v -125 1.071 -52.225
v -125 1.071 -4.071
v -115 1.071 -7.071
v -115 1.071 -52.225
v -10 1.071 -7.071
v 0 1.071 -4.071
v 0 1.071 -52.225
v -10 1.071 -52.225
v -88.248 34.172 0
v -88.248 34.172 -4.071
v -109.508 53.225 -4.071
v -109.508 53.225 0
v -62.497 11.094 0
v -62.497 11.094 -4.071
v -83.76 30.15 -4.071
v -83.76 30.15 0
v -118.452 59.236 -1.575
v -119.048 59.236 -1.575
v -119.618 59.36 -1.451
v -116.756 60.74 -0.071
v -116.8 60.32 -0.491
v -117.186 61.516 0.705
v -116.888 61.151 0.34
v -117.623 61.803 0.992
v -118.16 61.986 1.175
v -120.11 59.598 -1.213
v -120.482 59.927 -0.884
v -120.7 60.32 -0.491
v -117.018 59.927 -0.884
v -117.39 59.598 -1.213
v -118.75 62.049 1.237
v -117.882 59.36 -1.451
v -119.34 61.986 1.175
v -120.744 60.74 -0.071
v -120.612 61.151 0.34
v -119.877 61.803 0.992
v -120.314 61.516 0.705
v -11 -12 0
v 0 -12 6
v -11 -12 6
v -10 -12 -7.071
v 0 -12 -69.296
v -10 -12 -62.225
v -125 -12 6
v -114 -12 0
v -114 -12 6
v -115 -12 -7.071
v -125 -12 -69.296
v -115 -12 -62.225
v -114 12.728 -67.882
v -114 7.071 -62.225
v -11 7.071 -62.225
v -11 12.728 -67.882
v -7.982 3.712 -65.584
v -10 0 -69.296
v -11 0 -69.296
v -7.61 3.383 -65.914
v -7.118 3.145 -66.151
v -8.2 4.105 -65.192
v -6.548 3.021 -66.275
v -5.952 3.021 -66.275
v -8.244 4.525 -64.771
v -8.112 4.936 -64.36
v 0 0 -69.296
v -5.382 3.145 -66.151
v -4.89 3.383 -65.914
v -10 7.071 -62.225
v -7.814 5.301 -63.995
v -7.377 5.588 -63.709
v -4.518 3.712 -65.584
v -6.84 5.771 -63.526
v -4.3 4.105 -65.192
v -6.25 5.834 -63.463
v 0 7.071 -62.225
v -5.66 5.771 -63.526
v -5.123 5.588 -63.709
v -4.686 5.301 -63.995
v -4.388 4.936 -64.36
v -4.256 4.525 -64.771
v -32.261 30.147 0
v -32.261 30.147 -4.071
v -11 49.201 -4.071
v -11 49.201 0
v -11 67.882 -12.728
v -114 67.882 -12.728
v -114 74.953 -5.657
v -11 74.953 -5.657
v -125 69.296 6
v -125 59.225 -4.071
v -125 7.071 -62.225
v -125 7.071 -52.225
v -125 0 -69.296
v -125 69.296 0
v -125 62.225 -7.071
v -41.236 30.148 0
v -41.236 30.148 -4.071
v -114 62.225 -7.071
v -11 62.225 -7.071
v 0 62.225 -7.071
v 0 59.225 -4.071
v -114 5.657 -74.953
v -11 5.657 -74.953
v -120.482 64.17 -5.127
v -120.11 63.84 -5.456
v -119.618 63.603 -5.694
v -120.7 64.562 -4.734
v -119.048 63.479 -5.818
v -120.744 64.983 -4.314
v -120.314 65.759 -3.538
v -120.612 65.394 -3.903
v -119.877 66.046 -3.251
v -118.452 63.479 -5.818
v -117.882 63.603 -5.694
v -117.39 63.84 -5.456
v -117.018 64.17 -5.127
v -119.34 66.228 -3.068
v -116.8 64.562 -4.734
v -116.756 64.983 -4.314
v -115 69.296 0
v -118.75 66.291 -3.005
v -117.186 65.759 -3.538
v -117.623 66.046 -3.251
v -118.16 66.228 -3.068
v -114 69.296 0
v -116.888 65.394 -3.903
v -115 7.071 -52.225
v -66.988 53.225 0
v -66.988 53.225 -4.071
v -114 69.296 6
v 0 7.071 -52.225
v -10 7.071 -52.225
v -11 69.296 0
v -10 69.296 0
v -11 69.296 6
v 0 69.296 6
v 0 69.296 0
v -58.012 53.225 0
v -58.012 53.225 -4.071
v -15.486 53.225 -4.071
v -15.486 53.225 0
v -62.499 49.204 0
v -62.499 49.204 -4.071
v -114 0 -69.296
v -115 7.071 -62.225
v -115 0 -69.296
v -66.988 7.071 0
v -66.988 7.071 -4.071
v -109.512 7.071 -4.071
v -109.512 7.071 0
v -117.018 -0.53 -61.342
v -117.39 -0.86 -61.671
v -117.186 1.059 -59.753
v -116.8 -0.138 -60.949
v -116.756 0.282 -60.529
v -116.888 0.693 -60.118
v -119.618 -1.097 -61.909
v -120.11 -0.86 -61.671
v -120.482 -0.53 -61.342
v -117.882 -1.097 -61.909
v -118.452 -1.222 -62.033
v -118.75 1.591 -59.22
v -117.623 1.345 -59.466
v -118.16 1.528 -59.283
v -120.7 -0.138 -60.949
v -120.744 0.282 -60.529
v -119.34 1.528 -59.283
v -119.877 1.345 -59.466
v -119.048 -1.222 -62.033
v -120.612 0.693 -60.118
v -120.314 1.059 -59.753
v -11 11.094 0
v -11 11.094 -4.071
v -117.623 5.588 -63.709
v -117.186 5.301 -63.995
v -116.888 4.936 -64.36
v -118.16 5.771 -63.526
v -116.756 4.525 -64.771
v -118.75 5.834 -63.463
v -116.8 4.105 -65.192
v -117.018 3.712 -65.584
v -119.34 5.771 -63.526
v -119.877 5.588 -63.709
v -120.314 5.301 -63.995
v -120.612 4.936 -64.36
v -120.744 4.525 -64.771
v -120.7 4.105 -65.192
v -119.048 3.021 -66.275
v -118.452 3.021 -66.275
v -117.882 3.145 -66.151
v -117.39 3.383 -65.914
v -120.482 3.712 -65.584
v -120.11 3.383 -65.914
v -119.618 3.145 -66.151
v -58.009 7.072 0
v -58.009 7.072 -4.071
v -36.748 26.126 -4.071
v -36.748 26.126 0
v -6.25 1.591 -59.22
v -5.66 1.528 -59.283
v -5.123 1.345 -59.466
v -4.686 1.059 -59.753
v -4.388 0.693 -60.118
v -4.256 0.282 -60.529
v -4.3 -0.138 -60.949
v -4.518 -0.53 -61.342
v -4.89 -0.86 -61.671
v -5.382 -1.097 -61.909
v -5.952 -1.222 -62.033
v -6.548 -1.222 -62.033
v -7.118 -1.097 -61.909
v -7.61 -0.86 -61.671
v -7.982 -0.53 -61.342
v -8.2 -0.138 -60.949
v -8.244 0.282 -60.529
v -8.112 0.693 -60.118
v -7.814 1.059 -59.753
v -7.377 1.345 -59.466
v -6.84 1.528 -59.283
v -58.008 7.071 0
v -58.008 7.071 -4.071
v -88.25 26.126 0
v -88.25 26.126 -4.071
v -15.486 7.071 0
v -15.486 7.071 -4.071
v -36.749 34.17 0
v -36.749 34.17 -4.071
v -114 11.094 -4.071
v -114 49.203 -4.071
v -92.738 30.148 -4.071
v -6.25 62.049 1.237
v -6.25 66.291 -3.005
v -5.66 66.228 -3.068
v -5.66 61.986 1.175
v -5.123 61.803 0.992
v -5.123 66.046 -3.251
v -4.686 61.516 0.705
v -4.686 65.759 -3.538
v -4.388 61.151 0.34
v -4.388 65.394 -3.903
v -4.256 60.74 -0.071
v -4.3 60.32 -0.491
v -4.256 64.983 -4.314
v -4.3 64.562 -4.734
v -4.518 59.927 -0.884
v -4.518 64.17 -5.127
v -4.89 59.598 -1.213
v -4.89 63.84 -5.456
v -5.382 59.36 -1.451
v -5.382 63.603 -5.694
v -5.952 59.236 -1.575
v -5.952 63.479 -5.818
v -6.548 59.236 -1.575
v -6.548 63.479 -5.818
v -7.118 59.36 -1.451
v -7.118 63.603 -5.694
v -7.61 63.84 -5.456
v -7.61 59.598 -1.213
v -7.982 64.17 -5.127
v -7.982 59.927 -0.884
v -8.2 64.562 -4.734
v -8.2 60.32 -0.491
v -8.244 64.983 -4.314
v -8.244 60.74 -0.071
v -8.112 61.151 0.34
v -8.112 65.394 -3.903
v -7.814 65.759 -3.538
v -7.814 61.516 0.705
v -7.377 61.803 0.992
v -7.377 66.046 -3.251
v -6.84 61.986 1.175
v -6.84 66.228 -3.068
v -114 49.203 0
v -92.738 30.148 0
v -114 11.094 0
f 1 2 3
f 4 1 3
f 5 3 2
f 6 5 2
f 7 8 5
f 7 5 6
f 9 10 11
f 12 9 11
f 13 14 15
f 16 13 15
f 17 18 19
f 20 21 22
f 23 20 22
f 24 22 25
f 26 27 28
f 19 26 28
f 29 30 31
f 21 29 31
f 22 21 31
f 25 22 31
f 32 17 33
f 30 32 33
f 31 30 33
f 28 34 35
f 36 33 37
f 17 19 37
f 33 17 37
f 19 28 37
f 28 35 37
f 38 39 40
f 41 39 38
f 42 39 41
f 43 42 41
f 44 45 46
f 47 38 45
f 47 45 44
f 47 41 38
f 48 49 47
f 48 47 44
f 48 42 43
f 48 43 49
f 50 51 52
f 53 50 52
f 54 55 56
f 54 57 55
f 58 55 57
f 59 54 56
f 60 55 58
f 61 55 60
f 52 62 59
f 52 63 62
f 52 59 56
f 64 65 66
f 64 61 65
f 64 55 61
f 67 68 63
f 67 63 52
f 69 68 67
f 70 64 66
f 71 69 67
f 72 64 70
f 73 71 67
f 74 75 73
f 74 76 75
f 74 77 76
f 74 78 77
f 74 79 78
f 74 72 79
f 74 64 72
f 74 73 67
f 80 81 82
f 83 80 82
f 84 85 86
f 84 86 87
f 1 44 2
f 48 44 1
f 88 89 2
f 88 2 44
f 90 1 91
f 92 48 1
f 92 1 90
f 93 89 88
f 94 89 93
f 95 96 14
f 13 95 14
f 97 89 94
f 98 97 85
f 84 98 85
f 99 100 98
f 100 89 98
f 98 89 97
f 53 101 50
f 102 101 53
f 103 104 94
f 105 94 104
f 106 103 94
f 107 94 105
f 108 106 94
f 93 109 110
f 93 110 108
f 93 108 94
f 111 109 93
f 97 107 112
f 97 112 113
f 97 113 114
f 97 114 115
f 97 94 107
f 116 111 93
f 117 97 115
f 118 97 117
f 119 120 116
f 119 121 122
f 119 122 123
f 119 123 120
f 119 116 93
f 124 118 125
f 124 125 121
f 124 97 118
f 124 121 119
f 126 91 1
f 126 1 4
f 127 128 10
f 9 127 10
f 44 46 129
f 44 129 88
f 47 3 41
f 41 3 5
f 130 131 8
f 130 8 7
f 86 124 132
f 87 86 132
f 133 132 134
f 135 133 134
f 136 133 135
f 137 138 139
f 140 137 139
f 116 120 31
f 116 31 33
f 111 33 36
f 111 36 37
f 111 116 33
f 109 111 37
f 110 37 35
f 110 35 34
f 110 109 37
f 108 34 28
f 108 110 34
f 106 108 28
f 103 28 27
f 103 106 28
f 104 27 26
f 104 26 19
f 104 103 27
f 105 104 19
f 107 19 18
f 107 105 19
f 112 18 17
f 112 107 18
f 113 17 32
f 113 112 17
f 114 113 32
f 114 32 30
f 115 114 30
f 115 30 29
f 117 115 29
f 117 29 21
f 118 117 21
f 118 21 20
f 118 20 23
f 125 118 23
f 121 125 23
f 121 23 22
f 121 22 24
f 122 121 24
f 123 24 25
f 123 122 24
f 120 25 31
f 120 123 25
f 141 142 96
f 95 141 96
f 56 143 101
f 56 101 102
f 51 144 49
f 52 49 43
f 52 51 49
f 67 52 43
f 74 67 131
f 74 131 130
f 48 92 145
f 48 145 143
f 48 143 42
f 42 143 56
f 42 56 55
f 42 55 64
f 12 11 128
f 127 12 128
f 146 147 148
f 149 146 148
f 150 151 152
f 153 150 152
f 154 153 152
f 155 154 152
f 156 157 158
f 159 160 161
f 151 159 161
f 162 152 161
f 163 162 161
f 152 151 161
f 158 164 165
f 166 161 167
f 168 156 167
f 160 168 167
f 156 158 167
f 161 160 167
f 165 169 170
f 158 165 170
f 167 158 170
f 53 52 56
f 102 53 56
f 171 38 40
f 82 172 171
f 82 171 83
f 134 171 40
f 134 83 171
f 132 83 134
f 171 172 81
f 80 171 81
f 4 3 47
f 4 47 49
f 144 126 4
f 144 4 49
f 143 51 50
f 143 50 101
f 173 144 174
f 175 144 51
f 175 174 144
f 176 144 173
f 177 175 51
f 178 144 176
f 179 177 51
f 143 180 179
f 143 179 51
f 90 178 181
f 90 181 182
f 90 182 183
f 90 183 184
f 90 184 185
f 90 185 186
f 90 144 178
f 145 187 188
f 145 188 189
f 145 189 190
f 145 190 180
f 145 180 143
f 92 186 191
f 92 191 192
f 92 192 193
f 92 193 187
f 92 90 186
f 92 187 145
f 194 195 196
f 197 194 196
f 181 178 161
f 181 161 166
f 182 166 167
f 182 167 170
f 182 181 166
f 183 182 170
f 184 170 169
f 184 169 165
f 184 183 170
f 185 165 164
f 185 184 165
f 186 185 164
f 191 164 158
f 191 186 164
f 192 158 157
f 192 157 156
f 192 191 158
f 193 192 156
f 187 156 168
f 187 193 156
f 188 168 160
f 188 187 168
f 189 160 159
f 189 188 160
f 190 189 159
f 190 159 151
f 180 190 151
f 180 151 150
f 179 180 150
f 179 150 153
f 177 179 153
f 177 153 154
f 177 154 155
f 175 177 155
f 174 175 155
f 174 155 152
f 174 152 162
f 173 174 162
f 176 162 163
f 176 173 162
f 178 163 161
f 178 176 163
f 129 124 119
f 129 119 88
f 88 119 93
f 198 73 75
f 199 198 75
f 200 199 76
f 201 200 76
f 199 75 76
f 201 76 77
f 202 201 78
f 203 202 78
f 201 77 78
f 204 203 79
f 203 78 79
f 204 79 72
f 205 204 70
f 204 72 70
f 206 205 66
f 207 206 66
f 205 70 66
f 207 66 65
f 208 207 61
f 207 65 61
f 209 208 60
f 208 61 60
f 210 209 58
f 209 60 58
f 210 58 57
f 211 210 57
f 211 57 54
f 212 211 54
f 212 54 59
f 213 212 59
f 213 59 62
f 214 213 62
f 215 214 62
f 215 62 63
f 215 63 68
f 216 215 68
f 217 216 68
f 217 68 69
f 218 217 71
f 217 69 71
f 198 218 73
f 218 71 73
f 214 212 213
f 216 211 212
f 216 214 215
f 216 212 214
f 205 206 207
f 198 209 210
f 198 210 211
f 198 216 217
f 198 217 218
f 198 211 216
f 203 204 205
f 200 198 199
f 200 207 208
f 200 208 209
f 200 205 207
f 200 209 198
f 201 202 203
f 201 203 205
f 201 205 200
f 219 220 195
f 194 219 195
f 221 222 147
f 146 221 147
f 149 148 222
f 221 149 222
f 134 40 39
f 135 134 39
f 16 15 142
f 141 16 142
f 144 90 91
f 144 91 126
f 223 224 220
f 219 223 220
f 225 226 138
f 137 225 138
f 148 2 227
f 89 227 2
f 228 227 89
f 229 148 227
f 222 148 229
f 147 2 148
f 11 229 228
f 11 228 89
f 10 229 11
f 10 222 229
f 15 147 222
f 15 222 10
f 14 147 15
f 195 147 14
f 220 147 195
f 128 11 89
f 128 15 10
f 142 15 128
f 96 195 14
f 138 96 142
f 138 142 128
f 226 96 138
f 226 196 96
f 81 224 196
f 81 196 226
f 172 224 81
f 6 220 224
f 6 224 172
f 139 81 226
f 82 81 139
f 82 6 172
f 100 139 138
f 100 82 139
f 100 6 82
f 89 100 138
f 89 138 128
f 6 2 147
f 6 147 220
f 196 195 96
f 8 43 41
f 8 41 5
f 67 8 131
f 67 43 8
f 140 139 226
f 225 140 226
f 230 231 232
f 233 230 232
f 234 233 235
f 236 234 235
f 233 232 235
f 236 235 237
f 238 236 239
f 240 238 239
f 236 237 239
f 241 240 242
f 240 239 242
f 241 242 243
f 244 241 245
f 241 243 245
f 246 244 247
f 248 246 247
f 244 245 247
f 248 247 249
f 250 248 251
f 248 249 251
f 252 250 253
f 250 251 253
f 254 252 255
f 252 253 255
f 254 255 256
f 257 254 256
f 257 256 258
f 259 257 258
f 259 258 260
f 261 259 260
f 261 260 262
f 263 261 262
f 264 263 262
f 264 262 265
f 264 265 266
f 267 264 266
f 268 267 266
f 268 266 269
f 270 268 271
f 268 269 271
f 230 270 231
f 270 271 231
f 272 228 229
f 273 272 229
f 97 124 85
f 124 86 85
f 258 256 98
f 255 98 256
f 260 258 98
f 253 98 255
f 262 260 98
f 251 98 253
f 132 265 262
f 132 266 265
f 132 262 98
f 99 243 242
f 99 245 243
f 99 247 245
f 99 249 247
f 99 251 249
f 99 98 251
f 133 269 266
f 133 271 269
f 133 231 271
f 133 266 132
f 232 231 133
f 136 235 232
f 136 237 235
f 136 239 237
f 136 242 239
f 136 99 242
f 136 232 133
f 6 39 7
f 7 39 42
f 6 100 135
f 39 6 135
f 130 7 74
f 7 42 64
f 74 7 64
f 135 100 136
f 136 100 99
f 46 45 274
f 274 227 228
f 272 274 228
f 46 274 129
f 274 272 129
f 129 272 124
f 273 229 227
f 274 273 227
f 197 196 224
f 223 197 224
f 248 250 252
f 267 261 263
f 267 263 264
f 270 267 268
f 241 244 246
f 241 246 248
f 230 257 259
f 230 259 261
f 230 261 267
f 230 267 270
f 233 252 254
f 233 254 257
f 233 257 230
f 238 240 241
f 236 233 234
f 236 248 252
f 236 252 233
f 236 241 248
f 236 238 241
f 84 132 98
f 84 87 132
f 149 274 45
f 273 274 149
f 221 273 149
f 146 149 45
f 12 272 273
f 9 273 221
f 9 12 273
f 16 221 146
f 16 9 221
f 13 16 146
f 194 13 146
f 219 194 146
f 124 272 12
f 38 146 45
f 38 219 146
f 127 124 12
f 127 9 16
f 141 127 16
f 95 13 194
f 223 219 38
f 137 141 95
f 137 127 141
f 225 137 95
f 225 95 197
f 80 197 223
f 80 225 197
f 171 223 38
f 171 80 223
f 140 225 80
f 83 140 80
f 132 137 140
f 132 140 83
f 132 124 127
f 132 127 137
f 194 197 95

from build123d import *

# Parameters (mm, degrees)
BOSS_EXTRUDE3_DEPTH  = 125
SKETCH3_W            = 125
SKETCH3_H            = 69.296464556
BOSS_EXTRUDE5_DEPTH  = 12
CUT_EXTRUDE1_DEPTH   = 159.836393815
SKETCH7_W            = 105
SKETCH7_H            = 10
BOSS_EXTRUDE6_DEPTH  = 8
SKETCH8_W            = 105
SKETCH8_H            = 10
BOSS_EXTRUDE7_DEPTH  = 8
SKETCH9_W            = 105
SKETCH9_H            = 55.154328932
CUT_EXTRUDE2_DEPTH   = 161.78246173
SKETCH11_W           = 10
SKETCH11_H           = 55.154328932
CUT_EXTRUDE3_DEPTH   = 6
SKETCH12_W           = 10
SKETCH12_H           = 55.154328932
CUT_EXTRUDE4_DEPTH   = 6
SKETCH13_W           = 105
SKETCH13_H           = 61.154328932
CUT_EXTRUDE6_DEPTH   = 3
SKETCH14_R           = 1.9
CUT_EXTRUDE8_DEPTH   = 6
SKETCH15_R           = 1.9
CUT_EXTRUDE9_DEPTH   = 6
BOSS_EXTRUDE9_REACH  = 158.4
SKETCH25_W           = 10
SKETCH25_H           = 6
BOSS_EXTRUDE13_DEPTH = 10
CUT_EXTRUDE10_DEPTH  = 1
CUT_EXTRUDE11_DEPTH  = 1
SKETCH29_W           = 11
SKETCH29_H           = 81.296464556
BOSS_EXTRUDE15_DEPTH = 6
SKETCH31_R           = 2
CUT_EXTRUDE16_DEPTH  = 6
SKETCH32_R           = 2
CUT_EXTRUDE17_DEPTH  = 6
CUT_EXTRUDE22_DEPTH  = 157.400127877
CUT_EXTRUDE23_DEPTH  = 157.400127877
CUT_EXTRUDE26_REACH  = 164.072


with BuildPart() as part:
    # Sketch1 → Boss-Extrude3 (new body)
    with BuildSketch(Plane(origin=(0, 0, 0), x_dir=(0, 0, -1), z_dir=(1, 0, 0))):
        Polygon((0, 0), (69.296464556, 0), (0, 69.296464556), align=None)
    extrude(amount=-BOSS_EXTRUDE3_DEPTH)

    # Sketch3 → Boss-Extrude5 (add)
    with BuildSketch(Plane.XZ):
        with Locations((-62.5, -34.648232278)):
            Rectangle(SKETCH3_W, SKETCH3_H)
    extrude(amount=BOSS_EXTRUDE5_DEPTH)

    # Sketch6 → Cut-Extrude1 (cut, through all)
    with BuildSketch(Plane.ZY.offset(125)):
        Polygon((-7.071067812, 62.225396744), (-62.225396744, 7.071067812), (-7.071067812, 7.071067812), align=None)
    extrude(amount=-CUT_EXTRUDE1_DEPTH, mode=Mode.SUBTRACT)

    # Sketch7 → Boss-Extrude6 (add)
    with BuildSketch(Plane(origin=(0, 34.648232278, -34.648232278), x_dir=(1, 0, 0), z_dir=(0, 0.7071067811865515, -0.7071067811865436))):
        with Locations((-62.5, 44)):
            Rectangle(SKETCH7_W, SKETCH7_H)
    extrude(amount=BOSS_EXTRUDE6_DEPTH)

    # Sketch8 → Boss-Extrude7 (add)
    with BuildSketch(Plane(origin=(0, 34.648232278, -34.648232278), x_dir=(1, 0, 0), z_dir=(0, 0.7071067811865515, -0.7071067811865436))):
        with Locations((-62.5, -44)):
            Rectangle(SKETCH8_W, SKETCH8_H)
    extrude(amount=BOSS_EXTRUDE7_DEPTH)

    # Sketch9 → Cut-Extrude2 (cut, through all)
    with BuildSketch(Plane(origin=(0, 7.071067812, 0), x_dir=(1, 0, 0), z_dir=(0, 1, 0))):
        with Locations((-62.5, 34.648232278)):
            Rectangle(SKETCH9_W, SKETCH9_H)
    extrude(amount=-CUT_EXTRUDE2_DEPTH, mode=Mode.SUBTRACT)

    # Sketch11 → Cut-Extrude3 (cut)
    with BuildSketch(Plane(origin=(0, 7.071067812, 0), x_dir=(1, 0, 0), z_dir=(0, 1, 0))):
        with Locations((-5, 34.648232278)):
            Rectangle(SKETCH11_W, SKETCH11_H)
    extrude(amount=-CUT_EXTRUDE3_DEPTH, mode=Mode.SUBTRACT)

    # Sketch12 → Cut-Extrude4 (cut)
    with BuildSketch(Plane(origin=(0, 7.071067812, 0), x_dir=(1, 0, 0), z_dir=(0, 1, 0))):
        with Locations((-120, 34.648232278)):
            Rectangle(SKETCH12_W, SKETCH12_H)
    extrude(amount=-CUT_EXTRUDE4_DEPTH, mode=Mode.SUBTRACT)

    # Sketch13 → Cut-Extrude6 (cut)
    with BuildSketch(Plane(origin=(0, 0, -7.071067812), x_dir=(-1, 0, 0), z_dir=(0, 0, -1))):
        with Locations((62.5, 31.648232278)):
            Rectangle(SKETCH13_W, SKETCH13_H)
    extrude(amount=-CUT_EXTRUDE6_DEPTH, mode=Mode.SUBTRACT)

    # Sketch14 → Cut-Extrude8 (cut)
    with BuildSketch(Plane(origin=(0, 34.648232278, -34.648232278), x_dir=(1, 0, 0), z_dir=(0, 0.7071067811865515, -0.7071067811865436))):
        with Locations(Location((-6.25, 42.75, 0), (0, 0, 270))):
            Circle(SKETCH14_R)
    cut_extrude8 = extrude(amount=-CUT_EXTRUDE8_DEPTH, mode=Mode.SUBTRACT)

    # Mirror1: Cut-Extrude8 across plane
    add(cut_extrude8.mirror(Plane(origin=(-62.5, 0, 0), x_dir=(0, 0, 1), z_dir=(1, 0, 0))), mode=Mode.SUBTRACT)

    # Sketch15 → Cut-Extrude9 (cut)
    with BuildSketch(Plane(origin=(0, 34.648232278, -34.648232278), x_dir=(1, 0, 0), z_dir=(0, 0.7071067811865515, -0.7071067811865436))):
        with Locations(Location((-6.25, -42.75, 0), (0, 0, 270))):
            Circle(SKETCH15_R)
    cut_extrude9 = extrude(amount=-CUT_EXTRUDE9_DEPTH, mode=Mode.SUBTRACT)

    # Mirror2: Cut-Extrude9 across plane
    add(cut_extrude9.mirror(Plane(origin=(-62.5, 0, 0), x_dir=(0, 0, 1), z_dir=(1, 0, 0))), mode=Mode.SUBTRACT)

    # Sketch22 → Boss-Extrude9 (add, up to next)
    with BuildSketch(Plane.ZY.offset(10), mode=Mode.PRIVATE) as boss_extrude9_sk1:
        Polygon((-7.071067812, 62.225396744), (-4.071067812, 59.225396744), (-4.071067812, 62.225396744), align=None)
    boss_extrude9_tool1 = extrude(boss_extrude9_sk1.sketch, amount=BOSS_EXTRUDE9_REACH, mode=Mode.PRIVATE) - part.part
    add(boss_extrude9_tool1.solids().sort_by_distance((-10, 61.225397, -5.071068))[0])

    # Sketch25 → Boss-Extrude13 (add)
    with BuildSketch(Plane.XY.offset(-62.225396744)):
        with Locations((-5, 4.071067812)):
            Rectangle(SKETCH25_W, SKETCH25_H)
        with Locations((-120, 4.071067812)):
            Rectangle(SKETCH25_W, SKETCH25_H)
    extrude(amount=BOSS_EXTRUDE13_DEPTH)

    # Sketch26 → Cut-Extrude10 (cut)
    with BuildSketch(Plane(origin=(-10, 0, 0), x_dir=(0, 0, -1), z_dir=(1, 0, 0))):
        Polygon((0, 69.296464556), (7.071067812, 62.225396744), (12.727922061, 67.882250994), (5.656854249, 74.953318806), align=None)
    cut_extrude10 = extrude(amount=-CUT_EXTRUDE10_DEPTH, mode=Mode.SUBTRACT)

    # Sketch27 → Cut-Extrude11 (cut)
    with BuildSketch(Plane(origin=(-10, 0, 0), x_dir=(0, 0, -1), z_dir=(1, 0, 0))):
        Polygon((62.225396744, 7.071067812), (69.296464556, 0), (74.953318806, 5.656854249), (67.882250994, 12.727922061), align=None)
    cut_extrude11 = extrude(amount=-CUT_EXTRUDE11_DEPTH, mode=Mode.SUBTRACT)

    # Mirror3: Cut-Extrude10, Cut-Extrude11 across plane
    add(cut_extrude10.mirror(Plane(origin=(-62.5, 0, 0), x_dir=(0, 0, 1), z_dir=(1, 0, 0))), mode=Mode.SUBTRACT)
    add(cut_extrude11.mirror(Plane(origin=(-62.5, 0, 0), x_dir=(0, 0, 1), z_dir=(1, 0, 0))), mode=Mode.SUBTRACT)

    # Sketch29 → Boss-Extrude15 (add)
    with BuildSketch(Plane.XY):
        with Locations((-5.5, 28.648232278)):
            Rectangle(SKETCH29_W, SKETCH29_H)
    boss_extrude15 = extrude(amount=BOSS_EXTRUDE15_DEPTH)

    # Mirror4: Boss-Extrude15 across plane
    add(boss_extrude15.mirror(Plane(origin=(-62.5, 0, 0), x_dir=(0, 0, 1), z_dir=(1, 0, 0))))

    # Sketch31 → Cut-Extrude16 (cut)
    with BuildSketch(Plane(origin=(0, 34.648232278, -34.648232278), x_dir=(1, 0, 0), z_dir=(0, 0.7071067811865513, -0.7071067811865438))):
        with Locations(Location((-6.25, 42.75, 0), (0, 0, 270))):
            Circle(SKETCH31_R)
    cut_extrude16 = extrude(amount=-CUT_EXTRUDE16_DEPTH, mode=Mode.SUBTRACT)

    # Sketch32 → Cut-Extrude17 (cut)
    with BuildSketch(Plane(origin=(0, 34.648232278, -34.648232278), x_dir=(1, 0, 0), z_dir=(0, 0.7071067811865513, -0.7071067811865438))):
        with Locations(Location((-6.25, -42.75, 0), (0, 0, 270))):
            Circle(SKETCH32_R)
    cut_extrude17 = extrude(amount=-CUT_EXTRUDE17_DEPTH, mode=Mode.SUBTRACT)

    # Mirror5: Cut-Extrude16, Cut-Extrude17 across plane
    add(cut_extrude16.mirror(Plane(origin=(-62.5, 0, 0), x_dir=(0, 0, 1), z_dir=(1, 0, 0))), mode=Mode.SUBTRACT)
    add(cut_extrude17.mirror(Plane(origin=(-62.5, 0, 0), x_dir=(0, 0, 1), z_dir=(1, 0, 0))), mode=Mode.SUBTRACT)

    # Sketch41 → Cut-Extrude22 (cut, through all)
    with BuildSketch(Plane.ZY.offset(10)):
        Polygon((-7.071067812, 1.071067812), (-4.071067812, 1.071067812), (-4.071067812, 59.225396744), (-7.071067812, 62.225396744), align=None)
    extrude(amount=-CUT_EXTRUDE22_DEPTH, mode=Mode.SUBTRACT)

    # Sketch42 → Cut-Extrude23 (cut, through all)
    with BuildSketch(Plane(origin=(-115, 0, 0), x_dir=(0, 0, -1), z_dir=(1, 0, 0))):
        Polygon((7.071067812, 1.071067812), (4.071067812, 1.071067812), (4.071067812, 59.225396744), (7.071067812, 62.225396744), align=None)
    extrude(amount=-CUT_EXTRUDE23_DEPTH, mode=Mode.SUBTRACT)

    # Sketch43 → Cut-Extrude26 (cut, up to next)
    with BuildSketch(Plane(origin=(0, 0, -4.071067812), x_dir=(-1, 0, 0), z_dir=(0, 0, -1)), mode=Mode.PRIVATE) as cut_extrude26_sk1:
        Polygon((36.748988877, 34.169774937), (58.011664466, 53.225396744), (15.486313289, 53.225396744), align=None)
    cut_extrude26_tool1 = extrude(cut_extrude26_sk1.sketch, amount=-CUT_EXTRUDE26_REACH, mode=Mode.PRIVATE) & part.part
    # Sketch43 → Cut-Extrude26 (cut, up to next)
    with BuildSketch(Plane(origin=(0, 0, -4.071067812), x_dir=(-1, 0, 0), z_dir=(0, 0, -1)), mode=Mode.PRIVATE) as cut_extrude26_sk2:
        Polygon((32.260614543, 30.147291337), (11, 49.201066035), (11, 11.093516639), align=None)
    cut_extrude26_tool2 = extrude(cut_extrude26_sk2.sketch, amount=-CUT_EXTRUDE26_REACH, mode=Mode.PRIVATE) & part.part
    # Sketch43 → Cut-Extrude26 (cut, up to next)
    with BuildSketch(Plane(origin=(0, 0, -4.071067812), x_dir=(-1, 0, 0), z_dir=(0, 0, -1)), mode=Mode.PRIVATE) as cut_extrude26_sk3:
        Polygon((58.009015214, 7.07156019), (36.747854103, 26.125824723), (15.486143585, 7.071067812), (58.008465808, 7.071067812), align=None)
    cut_extrude26_tool3 = extrude(cut_extrude26_sk3.sketch, amount=-CUT_EXTRUDE26_REACH, mode=Mode.PRIVATE) & part.part
    # Sketch43 → Cut-Extrude26 (cut, up to next)
    with BuildSketch(Plane(origin=(0, 0, -4.071067812), x_dir=(-1, 0, 0), z_dir=(0, 0, -1)), mode=Mode.PRIVATE) as cut_extrude26_sk4:
        Polygon((83.760065137, 30.149665598), (62.498904026, 49.20393013), (41.236228437, 30.148308322), (62.497389548, 11.09404379), align=None)
    cut_extrude26_tool4 = extrude(cut_extrude26_sk4.sketch, amount=-CUT_EXTRUDE26_REACH, mode=Mode.PRIVATE) & part.part
    # Sketch43 → Cut-Extrude26 (cut, up to next)
    with BuildSketch(Plane(origin=(0, 0, -4.071067812), x_dir=(-1, 0, 0), z_dir=(0, 0, -1)), mode=Mode.PRIVATE) as cut_extrude26_sk5:
        Polygon((109.511664466, 7.071067812), (88.249757212, 26.126001038), (66.987849957, 7.071067812), align=None)
    cut_extrude26_tool5 = extrude(cut_extrude26_sk5.sketch, amount=-CUT_EXTRUDE26_REACH, mode=Mode.PRIVATE) & part.part
    # Sketch43 → Cut-Extrude26 (cut, up to next)
    with BuildSketch(Plane(origin=(0, 0, -4.071067812), x_dir=(-1, 0, 0), z_dir=(0, 0, -1)), mode=Mode.PRIVATE) as cut_extrude26_sk6:
        Polygon((114, 11.093516639), (114, 49.203383091), (92.738092746, 30.148449865), align=None)
    cut_extrude26_tool6 = extrude(cut_extrude26_sk6.sketch, amount=-CUT_EXTRUDE26_REACH, mode=Mode.PRIVATE) & part.part
    # Sketch43 → Cut-Extrude26 (cut, up to next)
    with BuildSketch(Plane(origin=(0, 0, -4.071067812), x_dir=(-1, 0, 0), z_dir=(0, 0, -1)), mode=Mode.PRIVATE) as cut_extrude26_sk7:
        Polygon((109.508465808, 53.225396744), (66.988335534, 53.225396744), (88.248400671, 34.172114425), align=None)
    cut_extrude26_tool7 = extrude(cut_extrude26_sk7.sketch, amount=-CUT_EXTRUDE26_REACH, mode=Mode.PRIVATE) & part.part
    add(cut_extrude26_tool1.solids().sort_by_distance((-36.748989, 46.873523, -4.071068))[0], mode=Mode.SUBTRACT)
    add(cut_extrude26_tool2.solids().sort_by_distance((-18.086872, 30.147291, -4.071068))[0], mode=Mode.SUBTRACT)
    add(cut_extrude26_tool3.solids().sort_by_distance((-36.747854, 13.422653, -4.071068))[0], mode=Mode.SUBTRACT)
    add(cut_extrude26_tool4.solids().sort_by_distance((-62.498147, 30.148987, -4.071068))[0], mode=Mode.SUBTRACT)
    add(cut_extrude26_tool5.solids().sort_by_distance((-88.249757, 13.422712, -4.071068))[0], mode=Mode.SUBTRACT)
    add(cut_extrude26_tool6.solids().sort_by_distance((-106.912698, 30.14845, -4.071068))[0], mode=Mode.SUBTRACT)
    add(cut_extrude26_tool7.solids().sort_by_distance((-88.248401, 46.874303, -4.071068))[0], mode=Mode.SUBTRACT)


solid = part.part
